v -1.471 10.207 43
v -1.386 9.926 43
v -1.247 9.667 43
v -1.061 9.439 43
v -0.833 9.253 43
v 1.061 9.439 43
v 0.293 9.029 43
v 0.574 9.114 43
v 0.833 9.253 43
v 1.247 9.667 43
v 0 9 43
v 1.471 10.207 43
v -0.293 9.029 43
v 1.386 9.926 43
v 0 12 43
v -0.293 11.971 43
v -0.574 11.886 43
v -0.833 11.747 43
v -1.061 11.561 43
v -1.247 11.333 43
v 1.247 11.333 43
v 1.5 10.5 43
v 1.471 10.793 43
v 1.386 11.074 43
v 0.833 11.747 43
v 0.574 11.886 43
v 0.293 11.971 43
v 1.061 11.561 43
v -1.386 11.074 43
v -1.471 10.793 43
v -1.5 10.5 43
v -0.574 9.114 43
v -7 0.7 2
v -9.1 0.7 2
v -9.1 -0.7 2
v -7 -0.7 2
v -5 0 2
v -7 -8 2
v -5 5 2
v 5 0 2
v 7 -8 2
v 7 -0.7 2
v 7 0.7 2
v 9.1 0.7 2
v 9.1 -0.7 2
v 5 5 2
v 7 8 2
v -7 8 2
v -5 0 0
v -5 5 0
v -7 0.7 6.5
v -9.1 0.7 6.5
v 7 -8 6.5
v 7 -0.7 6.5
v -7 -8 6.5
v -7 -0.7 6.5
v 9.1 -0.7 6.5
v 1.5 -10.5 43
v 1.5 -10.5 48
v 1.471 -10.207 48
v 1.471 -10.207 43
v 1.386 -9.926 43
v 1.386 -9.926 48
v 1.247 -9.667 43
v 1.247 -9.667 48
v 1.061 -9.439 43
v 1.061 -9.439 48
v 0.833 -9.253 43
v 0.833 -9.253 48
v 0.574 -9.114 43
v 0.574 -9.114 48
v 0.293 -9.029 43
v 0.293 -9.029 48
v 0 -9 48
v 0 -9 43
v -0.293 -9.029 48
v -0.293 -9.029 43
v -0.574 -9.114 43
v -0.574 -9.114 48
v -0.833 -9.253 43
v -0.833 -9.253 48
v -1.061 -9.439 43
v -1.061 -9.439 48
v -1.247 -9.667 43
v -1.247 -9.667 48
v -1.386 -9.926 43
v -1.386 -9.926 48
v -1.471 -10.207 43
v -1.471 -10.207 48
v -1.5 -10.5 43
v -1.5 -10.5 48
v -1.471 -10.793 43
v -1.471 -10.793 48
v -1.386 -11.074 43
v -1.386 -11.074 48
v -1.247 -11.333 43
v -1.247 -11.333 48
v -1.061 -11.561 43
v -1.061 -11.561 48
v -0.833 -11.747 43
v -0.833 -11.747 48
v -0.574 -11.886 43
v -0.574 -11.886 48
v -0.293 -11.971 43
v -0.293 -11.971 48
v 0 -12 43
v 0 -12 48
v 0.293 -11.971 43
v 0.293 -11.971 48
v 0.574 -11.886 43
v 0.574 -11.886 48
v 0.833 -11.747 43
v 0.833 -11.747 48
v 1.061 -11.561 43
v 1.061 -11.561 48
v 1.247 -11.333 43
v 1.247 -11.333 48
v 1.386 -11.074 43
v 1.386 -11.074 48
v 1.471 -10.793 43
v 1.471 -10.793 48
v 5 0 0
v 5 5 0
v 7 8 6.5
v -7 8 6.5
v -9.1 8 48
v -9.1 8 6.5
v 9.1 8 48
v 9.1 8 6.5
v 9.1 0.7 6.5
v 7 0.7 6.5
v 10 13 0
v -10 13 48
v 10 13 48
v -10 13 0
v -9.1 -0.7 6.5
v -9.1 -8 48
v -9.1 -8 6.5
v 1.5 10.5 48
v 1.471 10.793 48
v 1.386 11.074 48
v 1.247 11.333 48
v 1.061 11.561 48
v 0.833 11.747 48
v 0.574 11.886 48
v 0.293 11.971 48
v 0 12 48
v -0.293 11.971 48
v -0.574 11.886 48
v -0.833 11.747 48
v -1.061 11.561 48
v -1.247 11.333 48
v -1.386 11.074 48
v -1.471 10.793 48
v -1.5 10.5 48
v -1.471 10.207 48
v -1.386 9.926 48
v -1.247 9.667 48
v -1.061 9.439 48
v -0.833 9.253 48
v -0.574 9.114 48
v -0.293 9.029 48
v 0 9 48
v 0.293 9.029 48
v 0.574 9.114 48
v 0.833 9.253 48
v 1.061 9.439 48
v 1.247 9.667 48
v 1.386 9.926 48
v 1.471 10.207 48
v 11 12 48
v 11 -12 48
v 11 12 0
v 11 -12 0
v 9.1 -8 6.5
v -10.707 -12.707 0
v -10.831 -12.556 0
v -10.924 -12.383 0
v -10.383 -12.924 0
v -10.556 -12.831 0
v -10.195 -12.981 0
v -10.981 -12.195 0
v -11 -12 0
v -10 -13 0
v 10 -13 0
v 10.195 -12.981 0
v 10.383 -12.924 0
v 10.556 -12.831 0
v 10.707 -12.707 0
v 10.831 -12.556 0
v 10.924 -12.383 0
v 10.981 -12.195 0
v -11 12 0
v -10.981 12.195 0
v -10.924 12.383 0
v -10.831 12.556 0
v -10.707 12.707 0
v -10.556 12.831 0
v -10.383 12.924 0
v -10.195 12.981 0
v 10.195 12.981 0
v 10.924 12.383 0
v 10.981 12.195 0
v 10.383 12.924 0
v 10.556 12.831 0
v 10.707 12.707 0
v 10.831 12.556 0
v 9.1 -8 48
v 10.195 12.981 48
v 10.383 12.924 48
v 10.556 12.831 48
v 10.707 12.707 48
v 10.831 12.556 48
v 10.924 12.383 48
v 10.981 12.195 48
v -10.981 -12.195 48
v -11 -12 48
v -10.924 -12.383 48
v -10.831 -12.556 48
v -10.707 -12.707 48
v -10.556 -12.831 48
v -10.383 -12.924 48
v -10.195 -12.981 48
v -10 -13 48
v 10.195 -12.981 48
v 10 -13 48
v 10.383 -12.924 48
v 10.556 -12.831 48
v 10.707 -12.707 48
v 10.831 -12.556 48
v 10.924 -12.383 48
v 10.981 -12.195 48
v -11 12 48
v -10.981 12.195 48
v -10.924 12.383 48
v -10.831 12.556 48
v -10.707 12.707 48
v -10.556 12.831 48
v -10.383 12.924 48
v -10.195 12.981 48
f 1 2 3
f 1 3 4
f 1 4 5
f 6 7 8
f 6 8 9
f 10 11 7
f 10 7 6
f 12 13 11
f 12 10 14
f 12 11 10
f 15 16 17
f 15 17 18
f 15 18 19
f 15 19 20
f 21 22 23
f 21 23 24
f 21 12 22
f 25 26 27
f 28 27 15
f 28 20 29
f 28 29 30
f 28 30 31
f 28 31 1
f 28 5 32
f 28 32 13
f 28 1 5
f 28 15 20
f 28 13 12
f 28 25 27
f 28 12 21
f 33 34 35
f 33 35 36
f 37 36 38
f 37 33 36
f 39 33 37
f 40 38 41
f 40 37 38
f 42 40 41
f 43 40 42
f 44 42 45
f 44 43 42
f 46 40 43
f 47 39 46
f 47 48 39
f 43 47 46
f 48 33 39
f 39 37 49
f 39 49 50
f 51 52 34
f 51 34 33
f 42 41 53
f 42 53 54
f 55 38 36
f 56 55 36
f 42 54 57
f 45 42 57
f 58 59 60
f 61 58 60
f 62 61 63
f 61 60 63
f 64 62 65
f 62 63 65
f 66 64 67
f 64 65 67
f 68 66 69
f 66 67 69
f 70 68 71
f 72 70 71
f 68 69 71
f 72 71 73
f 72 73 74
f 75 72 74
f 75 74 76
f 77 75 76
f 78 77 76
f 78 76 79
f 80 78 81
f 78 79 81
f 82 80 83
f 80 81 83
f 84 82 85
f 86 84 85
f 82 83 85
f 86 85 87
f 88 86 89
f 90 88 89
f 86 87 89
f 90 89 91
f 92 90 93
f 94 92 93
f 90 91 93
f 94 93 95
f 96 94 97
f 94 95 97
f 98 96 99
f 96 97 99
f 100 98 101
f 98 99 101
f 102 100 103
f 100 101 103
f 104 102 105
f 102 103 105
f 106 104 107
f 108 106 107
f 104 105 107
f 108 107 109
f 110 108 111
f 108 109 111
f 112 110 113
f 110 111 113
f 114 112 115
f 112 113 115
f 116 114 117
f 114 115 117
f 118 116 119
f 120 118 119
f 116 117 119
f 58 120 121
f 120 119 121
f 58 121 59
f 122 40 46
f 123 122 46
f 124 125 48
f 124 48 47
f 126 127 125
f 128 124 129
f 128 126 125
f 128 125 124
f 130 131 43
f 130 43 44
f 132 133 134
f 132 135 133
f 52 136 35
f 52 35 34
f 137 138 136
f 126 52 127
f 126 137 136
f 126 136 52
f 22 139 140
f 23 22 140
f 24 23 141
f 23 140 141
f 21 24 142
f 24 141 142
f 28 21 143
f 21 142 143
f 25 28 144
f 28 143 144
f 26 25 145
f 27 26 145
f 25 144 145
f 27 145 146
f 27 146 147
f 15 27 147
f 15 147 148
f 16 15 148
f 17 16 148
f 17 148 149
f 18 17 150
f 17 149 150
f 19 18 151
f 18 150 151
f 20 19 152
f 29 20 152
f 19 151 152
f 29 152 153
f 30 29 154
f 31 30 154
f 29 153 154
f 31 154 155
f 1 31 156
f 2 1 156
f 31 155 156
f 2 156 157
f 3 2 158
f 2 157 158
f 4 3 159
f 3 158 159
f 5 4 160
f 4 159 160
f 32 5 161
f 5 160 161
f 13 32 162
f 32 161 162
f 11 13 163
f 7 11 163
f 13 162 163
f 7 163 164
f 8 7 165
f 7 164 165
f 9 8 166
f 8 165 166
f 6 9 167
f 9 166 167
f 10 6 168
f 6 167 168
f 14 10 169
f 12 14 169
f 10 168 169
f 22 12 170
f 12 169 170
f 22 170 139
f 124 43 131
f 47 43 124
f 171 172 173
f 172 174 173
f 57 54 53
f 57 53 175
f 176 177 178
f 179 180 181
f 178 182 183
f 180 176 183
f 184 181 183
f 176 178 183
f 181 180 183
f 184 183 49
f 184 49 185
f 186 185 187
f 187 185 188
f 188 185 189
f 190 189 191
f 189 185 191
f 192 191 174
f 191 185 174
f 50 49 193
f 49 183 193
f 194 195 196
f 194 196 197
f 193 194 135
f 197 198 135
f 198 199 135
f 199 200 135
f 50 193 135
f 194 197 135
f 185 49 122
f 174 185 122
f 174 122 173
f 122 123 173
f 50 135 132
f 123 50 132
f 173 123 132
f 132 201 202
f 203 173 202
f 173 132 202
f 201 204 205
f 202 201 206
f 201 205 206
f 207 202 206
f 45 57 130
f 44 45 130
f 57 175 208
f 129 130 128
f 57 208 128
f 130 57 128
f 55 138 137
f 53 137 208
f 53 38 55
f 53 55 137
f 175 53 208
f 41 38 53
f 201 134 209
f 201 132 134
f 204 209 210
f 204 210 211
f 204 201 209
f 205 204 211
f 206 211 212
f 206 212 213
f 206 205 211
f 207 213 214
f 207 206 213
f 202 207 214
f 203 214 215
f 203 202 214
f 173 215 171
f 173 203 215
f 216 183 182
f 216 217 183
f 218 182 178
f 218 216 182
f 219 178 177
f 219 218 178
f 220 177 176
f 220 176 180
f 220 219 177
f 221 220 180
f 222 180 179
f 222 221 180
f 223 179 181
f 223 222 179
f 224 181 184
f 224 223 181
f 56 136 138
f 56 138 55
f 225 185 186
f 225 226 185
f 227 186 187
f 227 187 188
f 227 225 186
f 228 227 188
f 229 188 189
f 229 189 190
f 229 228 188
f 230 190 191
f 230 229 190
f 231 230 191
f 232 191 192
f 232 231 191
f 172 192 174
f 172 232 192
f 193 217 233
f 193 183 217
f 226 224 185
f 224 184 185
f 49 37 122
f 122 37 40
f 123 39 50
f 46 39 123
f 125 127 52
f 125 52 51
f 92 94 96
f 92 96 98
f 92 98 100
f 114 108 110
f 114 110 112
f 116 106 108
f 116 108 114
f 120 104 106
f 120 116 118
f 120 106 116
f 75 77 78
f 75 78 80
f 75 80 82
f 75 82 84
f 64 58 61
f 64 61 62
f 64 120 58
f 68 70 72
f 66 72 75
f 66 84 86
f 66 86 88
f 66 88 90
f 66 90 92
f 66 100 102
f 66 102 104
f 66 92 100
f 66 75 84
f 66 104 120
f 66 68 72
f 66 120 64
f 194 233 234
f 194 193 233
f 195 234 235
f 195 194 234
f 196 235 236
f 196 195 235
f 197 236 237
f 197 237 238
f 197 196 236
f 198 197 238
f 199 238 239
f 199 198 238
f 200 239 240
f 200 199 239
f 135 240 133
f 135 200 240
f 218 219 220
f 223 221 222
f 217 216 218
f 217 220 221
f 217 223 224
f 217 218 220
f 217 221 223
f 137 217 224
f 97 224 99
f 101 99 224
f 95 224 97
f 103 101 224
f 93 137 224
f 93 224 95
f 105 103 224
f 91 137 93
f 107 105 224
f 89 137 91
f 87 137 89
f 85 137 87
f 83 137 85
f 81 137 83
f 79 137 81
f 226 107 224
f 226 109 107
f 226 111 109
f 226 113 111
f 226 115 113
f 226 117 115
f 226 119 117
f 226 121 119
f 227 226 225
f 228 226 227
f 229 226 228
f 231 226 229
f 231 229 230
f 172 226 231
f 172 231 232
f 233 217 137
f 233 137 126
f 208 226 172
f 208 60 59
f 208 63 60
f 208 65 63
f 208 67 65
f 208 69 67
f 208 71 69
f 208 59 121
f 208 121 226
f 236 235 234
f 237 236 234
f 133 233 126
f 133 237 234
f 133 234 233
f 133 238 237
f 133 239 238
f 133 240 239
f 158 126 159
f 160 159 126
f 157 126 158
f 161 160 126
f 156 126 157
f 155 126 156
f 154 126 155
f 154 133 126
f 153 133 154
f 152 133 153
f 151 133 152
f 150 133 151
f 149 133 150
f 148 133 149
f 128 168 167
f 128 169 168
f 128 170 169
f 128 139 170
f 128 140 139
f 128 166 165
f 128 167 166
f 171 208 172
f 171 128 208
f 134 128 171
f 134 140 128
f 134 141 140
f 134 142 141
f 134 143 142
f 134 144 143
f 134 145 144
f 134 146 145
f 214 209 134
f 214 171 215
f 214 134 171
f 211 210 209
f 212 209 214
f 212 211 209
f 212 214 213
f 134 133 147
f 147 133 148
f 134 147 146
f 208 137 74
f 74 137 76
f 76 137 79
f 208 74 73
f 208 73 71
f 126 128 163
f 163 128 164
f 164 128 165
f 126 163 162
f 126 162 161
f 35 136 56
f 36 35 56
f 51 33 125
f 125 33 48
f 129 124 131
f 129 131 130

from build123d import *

# Parameters (mm, degrees)
SKETCH_W        = 22
SKETCH_H        = 26
PAD_DEPTH       = 2
SKETCH007_W     = 10
SKETCH007_H     = 5
POCKET_DEPTH    = 2.001
SKETCH008_W     = 22
SKETCH008_H     = 26
SKETCH008_W_2   = 14
SKETCH008_H_2   = 16
PAD005_DEPTH    = 46
SKETCH009_W     = 18.2
SKETCH009_H     = 16
POCKET002_DEPTH = 41.5
SKETCH010_W     = 18.2
SKETCH010_H     = 1.4
POCKET003_DEPTH = 4.5
SKETCH013_R     = 1.5
POCKET005_DEPTH = 5
FILLET001_R     = 1


with BuildPart() as part:
    # Sketch → Pad (new body)
    with BuildSketch(Plane.XY):
        Rectangle(SKETCH_W, SKETCH_H)
    extrude(amount=PAD_DEPTH)

    # Sketch007 (on Face6 of Pad) → Pocket (cut, through all)
    with BuildSketch(Plane.XY.offset(2)):
        with Locations((0, 2.5)):
            Rectangle(SKETCH007_W, SKETCH007_H)
    extrude(amount=-POCKET_DEPTH, mode=Mode.SUBTRACT)

    # Sketch008 (on Face5 of Pocket) → Pad005 (join)
    with BuildSketch(Plane.XY.offset(2)):
        Rectangle(SKETCH008_W, SKETCH008_H)
        Rectangle(SKETCH008_W_2, SKETCH008_H_2, mode=Mode.SUBTRACT)
    extrude(amount=PAD005_DEPTH)

    # Sketch009 (on Face13 of Pad005) → Pocket002 (cut)
    with BuildSketch(Plane.XY.offset(48)):
        Rectangle(SKETCH009_W, SKETCH009_H)
    extrude(amount=-POCKET002_DEPTH, mode=Mode.SUBTRACT)

    # Sketch010 (on Face29 of Pocket002) → Pocket003 (cut)
    with BuildSketch(Plane.XY.offset(6.5)):
        Rectangle(SKETCH010_W, SKETCH010_H)
    extrude(amount=-POCKET003_DEPTH, mode=Mode.SUBTRACT)

    # Sketch013 (on Face13 of Pocket003) → Pocket005 (cut)
    with BuildSketch(Plane.XY.offset(48)):
        with Locations((0, 10.5)):
            Circle(SKETCH013_R)
        with Locations((0, -10.5)):
            Circle(SKETCH013_R)
    extrude(amount=-POCKET005_DEPTH, mode=Mode.SUBTRACT)

    # Fillet001
    fillet001_edges = [part.edges().sort_by_distance(p)[0] for p in [
        (-11, 13, 25),
        (-11, -13, 25),
        (11, 13, 25),
        (11, -13, 25),
        (11, -13, 1),
        (11, 13, 1),
        (-11, 13, 1),
        (-11, -13, 1),
    ]]
    fillet(fillet001_edges, radius=FILLET001_R)


solid = part.part
